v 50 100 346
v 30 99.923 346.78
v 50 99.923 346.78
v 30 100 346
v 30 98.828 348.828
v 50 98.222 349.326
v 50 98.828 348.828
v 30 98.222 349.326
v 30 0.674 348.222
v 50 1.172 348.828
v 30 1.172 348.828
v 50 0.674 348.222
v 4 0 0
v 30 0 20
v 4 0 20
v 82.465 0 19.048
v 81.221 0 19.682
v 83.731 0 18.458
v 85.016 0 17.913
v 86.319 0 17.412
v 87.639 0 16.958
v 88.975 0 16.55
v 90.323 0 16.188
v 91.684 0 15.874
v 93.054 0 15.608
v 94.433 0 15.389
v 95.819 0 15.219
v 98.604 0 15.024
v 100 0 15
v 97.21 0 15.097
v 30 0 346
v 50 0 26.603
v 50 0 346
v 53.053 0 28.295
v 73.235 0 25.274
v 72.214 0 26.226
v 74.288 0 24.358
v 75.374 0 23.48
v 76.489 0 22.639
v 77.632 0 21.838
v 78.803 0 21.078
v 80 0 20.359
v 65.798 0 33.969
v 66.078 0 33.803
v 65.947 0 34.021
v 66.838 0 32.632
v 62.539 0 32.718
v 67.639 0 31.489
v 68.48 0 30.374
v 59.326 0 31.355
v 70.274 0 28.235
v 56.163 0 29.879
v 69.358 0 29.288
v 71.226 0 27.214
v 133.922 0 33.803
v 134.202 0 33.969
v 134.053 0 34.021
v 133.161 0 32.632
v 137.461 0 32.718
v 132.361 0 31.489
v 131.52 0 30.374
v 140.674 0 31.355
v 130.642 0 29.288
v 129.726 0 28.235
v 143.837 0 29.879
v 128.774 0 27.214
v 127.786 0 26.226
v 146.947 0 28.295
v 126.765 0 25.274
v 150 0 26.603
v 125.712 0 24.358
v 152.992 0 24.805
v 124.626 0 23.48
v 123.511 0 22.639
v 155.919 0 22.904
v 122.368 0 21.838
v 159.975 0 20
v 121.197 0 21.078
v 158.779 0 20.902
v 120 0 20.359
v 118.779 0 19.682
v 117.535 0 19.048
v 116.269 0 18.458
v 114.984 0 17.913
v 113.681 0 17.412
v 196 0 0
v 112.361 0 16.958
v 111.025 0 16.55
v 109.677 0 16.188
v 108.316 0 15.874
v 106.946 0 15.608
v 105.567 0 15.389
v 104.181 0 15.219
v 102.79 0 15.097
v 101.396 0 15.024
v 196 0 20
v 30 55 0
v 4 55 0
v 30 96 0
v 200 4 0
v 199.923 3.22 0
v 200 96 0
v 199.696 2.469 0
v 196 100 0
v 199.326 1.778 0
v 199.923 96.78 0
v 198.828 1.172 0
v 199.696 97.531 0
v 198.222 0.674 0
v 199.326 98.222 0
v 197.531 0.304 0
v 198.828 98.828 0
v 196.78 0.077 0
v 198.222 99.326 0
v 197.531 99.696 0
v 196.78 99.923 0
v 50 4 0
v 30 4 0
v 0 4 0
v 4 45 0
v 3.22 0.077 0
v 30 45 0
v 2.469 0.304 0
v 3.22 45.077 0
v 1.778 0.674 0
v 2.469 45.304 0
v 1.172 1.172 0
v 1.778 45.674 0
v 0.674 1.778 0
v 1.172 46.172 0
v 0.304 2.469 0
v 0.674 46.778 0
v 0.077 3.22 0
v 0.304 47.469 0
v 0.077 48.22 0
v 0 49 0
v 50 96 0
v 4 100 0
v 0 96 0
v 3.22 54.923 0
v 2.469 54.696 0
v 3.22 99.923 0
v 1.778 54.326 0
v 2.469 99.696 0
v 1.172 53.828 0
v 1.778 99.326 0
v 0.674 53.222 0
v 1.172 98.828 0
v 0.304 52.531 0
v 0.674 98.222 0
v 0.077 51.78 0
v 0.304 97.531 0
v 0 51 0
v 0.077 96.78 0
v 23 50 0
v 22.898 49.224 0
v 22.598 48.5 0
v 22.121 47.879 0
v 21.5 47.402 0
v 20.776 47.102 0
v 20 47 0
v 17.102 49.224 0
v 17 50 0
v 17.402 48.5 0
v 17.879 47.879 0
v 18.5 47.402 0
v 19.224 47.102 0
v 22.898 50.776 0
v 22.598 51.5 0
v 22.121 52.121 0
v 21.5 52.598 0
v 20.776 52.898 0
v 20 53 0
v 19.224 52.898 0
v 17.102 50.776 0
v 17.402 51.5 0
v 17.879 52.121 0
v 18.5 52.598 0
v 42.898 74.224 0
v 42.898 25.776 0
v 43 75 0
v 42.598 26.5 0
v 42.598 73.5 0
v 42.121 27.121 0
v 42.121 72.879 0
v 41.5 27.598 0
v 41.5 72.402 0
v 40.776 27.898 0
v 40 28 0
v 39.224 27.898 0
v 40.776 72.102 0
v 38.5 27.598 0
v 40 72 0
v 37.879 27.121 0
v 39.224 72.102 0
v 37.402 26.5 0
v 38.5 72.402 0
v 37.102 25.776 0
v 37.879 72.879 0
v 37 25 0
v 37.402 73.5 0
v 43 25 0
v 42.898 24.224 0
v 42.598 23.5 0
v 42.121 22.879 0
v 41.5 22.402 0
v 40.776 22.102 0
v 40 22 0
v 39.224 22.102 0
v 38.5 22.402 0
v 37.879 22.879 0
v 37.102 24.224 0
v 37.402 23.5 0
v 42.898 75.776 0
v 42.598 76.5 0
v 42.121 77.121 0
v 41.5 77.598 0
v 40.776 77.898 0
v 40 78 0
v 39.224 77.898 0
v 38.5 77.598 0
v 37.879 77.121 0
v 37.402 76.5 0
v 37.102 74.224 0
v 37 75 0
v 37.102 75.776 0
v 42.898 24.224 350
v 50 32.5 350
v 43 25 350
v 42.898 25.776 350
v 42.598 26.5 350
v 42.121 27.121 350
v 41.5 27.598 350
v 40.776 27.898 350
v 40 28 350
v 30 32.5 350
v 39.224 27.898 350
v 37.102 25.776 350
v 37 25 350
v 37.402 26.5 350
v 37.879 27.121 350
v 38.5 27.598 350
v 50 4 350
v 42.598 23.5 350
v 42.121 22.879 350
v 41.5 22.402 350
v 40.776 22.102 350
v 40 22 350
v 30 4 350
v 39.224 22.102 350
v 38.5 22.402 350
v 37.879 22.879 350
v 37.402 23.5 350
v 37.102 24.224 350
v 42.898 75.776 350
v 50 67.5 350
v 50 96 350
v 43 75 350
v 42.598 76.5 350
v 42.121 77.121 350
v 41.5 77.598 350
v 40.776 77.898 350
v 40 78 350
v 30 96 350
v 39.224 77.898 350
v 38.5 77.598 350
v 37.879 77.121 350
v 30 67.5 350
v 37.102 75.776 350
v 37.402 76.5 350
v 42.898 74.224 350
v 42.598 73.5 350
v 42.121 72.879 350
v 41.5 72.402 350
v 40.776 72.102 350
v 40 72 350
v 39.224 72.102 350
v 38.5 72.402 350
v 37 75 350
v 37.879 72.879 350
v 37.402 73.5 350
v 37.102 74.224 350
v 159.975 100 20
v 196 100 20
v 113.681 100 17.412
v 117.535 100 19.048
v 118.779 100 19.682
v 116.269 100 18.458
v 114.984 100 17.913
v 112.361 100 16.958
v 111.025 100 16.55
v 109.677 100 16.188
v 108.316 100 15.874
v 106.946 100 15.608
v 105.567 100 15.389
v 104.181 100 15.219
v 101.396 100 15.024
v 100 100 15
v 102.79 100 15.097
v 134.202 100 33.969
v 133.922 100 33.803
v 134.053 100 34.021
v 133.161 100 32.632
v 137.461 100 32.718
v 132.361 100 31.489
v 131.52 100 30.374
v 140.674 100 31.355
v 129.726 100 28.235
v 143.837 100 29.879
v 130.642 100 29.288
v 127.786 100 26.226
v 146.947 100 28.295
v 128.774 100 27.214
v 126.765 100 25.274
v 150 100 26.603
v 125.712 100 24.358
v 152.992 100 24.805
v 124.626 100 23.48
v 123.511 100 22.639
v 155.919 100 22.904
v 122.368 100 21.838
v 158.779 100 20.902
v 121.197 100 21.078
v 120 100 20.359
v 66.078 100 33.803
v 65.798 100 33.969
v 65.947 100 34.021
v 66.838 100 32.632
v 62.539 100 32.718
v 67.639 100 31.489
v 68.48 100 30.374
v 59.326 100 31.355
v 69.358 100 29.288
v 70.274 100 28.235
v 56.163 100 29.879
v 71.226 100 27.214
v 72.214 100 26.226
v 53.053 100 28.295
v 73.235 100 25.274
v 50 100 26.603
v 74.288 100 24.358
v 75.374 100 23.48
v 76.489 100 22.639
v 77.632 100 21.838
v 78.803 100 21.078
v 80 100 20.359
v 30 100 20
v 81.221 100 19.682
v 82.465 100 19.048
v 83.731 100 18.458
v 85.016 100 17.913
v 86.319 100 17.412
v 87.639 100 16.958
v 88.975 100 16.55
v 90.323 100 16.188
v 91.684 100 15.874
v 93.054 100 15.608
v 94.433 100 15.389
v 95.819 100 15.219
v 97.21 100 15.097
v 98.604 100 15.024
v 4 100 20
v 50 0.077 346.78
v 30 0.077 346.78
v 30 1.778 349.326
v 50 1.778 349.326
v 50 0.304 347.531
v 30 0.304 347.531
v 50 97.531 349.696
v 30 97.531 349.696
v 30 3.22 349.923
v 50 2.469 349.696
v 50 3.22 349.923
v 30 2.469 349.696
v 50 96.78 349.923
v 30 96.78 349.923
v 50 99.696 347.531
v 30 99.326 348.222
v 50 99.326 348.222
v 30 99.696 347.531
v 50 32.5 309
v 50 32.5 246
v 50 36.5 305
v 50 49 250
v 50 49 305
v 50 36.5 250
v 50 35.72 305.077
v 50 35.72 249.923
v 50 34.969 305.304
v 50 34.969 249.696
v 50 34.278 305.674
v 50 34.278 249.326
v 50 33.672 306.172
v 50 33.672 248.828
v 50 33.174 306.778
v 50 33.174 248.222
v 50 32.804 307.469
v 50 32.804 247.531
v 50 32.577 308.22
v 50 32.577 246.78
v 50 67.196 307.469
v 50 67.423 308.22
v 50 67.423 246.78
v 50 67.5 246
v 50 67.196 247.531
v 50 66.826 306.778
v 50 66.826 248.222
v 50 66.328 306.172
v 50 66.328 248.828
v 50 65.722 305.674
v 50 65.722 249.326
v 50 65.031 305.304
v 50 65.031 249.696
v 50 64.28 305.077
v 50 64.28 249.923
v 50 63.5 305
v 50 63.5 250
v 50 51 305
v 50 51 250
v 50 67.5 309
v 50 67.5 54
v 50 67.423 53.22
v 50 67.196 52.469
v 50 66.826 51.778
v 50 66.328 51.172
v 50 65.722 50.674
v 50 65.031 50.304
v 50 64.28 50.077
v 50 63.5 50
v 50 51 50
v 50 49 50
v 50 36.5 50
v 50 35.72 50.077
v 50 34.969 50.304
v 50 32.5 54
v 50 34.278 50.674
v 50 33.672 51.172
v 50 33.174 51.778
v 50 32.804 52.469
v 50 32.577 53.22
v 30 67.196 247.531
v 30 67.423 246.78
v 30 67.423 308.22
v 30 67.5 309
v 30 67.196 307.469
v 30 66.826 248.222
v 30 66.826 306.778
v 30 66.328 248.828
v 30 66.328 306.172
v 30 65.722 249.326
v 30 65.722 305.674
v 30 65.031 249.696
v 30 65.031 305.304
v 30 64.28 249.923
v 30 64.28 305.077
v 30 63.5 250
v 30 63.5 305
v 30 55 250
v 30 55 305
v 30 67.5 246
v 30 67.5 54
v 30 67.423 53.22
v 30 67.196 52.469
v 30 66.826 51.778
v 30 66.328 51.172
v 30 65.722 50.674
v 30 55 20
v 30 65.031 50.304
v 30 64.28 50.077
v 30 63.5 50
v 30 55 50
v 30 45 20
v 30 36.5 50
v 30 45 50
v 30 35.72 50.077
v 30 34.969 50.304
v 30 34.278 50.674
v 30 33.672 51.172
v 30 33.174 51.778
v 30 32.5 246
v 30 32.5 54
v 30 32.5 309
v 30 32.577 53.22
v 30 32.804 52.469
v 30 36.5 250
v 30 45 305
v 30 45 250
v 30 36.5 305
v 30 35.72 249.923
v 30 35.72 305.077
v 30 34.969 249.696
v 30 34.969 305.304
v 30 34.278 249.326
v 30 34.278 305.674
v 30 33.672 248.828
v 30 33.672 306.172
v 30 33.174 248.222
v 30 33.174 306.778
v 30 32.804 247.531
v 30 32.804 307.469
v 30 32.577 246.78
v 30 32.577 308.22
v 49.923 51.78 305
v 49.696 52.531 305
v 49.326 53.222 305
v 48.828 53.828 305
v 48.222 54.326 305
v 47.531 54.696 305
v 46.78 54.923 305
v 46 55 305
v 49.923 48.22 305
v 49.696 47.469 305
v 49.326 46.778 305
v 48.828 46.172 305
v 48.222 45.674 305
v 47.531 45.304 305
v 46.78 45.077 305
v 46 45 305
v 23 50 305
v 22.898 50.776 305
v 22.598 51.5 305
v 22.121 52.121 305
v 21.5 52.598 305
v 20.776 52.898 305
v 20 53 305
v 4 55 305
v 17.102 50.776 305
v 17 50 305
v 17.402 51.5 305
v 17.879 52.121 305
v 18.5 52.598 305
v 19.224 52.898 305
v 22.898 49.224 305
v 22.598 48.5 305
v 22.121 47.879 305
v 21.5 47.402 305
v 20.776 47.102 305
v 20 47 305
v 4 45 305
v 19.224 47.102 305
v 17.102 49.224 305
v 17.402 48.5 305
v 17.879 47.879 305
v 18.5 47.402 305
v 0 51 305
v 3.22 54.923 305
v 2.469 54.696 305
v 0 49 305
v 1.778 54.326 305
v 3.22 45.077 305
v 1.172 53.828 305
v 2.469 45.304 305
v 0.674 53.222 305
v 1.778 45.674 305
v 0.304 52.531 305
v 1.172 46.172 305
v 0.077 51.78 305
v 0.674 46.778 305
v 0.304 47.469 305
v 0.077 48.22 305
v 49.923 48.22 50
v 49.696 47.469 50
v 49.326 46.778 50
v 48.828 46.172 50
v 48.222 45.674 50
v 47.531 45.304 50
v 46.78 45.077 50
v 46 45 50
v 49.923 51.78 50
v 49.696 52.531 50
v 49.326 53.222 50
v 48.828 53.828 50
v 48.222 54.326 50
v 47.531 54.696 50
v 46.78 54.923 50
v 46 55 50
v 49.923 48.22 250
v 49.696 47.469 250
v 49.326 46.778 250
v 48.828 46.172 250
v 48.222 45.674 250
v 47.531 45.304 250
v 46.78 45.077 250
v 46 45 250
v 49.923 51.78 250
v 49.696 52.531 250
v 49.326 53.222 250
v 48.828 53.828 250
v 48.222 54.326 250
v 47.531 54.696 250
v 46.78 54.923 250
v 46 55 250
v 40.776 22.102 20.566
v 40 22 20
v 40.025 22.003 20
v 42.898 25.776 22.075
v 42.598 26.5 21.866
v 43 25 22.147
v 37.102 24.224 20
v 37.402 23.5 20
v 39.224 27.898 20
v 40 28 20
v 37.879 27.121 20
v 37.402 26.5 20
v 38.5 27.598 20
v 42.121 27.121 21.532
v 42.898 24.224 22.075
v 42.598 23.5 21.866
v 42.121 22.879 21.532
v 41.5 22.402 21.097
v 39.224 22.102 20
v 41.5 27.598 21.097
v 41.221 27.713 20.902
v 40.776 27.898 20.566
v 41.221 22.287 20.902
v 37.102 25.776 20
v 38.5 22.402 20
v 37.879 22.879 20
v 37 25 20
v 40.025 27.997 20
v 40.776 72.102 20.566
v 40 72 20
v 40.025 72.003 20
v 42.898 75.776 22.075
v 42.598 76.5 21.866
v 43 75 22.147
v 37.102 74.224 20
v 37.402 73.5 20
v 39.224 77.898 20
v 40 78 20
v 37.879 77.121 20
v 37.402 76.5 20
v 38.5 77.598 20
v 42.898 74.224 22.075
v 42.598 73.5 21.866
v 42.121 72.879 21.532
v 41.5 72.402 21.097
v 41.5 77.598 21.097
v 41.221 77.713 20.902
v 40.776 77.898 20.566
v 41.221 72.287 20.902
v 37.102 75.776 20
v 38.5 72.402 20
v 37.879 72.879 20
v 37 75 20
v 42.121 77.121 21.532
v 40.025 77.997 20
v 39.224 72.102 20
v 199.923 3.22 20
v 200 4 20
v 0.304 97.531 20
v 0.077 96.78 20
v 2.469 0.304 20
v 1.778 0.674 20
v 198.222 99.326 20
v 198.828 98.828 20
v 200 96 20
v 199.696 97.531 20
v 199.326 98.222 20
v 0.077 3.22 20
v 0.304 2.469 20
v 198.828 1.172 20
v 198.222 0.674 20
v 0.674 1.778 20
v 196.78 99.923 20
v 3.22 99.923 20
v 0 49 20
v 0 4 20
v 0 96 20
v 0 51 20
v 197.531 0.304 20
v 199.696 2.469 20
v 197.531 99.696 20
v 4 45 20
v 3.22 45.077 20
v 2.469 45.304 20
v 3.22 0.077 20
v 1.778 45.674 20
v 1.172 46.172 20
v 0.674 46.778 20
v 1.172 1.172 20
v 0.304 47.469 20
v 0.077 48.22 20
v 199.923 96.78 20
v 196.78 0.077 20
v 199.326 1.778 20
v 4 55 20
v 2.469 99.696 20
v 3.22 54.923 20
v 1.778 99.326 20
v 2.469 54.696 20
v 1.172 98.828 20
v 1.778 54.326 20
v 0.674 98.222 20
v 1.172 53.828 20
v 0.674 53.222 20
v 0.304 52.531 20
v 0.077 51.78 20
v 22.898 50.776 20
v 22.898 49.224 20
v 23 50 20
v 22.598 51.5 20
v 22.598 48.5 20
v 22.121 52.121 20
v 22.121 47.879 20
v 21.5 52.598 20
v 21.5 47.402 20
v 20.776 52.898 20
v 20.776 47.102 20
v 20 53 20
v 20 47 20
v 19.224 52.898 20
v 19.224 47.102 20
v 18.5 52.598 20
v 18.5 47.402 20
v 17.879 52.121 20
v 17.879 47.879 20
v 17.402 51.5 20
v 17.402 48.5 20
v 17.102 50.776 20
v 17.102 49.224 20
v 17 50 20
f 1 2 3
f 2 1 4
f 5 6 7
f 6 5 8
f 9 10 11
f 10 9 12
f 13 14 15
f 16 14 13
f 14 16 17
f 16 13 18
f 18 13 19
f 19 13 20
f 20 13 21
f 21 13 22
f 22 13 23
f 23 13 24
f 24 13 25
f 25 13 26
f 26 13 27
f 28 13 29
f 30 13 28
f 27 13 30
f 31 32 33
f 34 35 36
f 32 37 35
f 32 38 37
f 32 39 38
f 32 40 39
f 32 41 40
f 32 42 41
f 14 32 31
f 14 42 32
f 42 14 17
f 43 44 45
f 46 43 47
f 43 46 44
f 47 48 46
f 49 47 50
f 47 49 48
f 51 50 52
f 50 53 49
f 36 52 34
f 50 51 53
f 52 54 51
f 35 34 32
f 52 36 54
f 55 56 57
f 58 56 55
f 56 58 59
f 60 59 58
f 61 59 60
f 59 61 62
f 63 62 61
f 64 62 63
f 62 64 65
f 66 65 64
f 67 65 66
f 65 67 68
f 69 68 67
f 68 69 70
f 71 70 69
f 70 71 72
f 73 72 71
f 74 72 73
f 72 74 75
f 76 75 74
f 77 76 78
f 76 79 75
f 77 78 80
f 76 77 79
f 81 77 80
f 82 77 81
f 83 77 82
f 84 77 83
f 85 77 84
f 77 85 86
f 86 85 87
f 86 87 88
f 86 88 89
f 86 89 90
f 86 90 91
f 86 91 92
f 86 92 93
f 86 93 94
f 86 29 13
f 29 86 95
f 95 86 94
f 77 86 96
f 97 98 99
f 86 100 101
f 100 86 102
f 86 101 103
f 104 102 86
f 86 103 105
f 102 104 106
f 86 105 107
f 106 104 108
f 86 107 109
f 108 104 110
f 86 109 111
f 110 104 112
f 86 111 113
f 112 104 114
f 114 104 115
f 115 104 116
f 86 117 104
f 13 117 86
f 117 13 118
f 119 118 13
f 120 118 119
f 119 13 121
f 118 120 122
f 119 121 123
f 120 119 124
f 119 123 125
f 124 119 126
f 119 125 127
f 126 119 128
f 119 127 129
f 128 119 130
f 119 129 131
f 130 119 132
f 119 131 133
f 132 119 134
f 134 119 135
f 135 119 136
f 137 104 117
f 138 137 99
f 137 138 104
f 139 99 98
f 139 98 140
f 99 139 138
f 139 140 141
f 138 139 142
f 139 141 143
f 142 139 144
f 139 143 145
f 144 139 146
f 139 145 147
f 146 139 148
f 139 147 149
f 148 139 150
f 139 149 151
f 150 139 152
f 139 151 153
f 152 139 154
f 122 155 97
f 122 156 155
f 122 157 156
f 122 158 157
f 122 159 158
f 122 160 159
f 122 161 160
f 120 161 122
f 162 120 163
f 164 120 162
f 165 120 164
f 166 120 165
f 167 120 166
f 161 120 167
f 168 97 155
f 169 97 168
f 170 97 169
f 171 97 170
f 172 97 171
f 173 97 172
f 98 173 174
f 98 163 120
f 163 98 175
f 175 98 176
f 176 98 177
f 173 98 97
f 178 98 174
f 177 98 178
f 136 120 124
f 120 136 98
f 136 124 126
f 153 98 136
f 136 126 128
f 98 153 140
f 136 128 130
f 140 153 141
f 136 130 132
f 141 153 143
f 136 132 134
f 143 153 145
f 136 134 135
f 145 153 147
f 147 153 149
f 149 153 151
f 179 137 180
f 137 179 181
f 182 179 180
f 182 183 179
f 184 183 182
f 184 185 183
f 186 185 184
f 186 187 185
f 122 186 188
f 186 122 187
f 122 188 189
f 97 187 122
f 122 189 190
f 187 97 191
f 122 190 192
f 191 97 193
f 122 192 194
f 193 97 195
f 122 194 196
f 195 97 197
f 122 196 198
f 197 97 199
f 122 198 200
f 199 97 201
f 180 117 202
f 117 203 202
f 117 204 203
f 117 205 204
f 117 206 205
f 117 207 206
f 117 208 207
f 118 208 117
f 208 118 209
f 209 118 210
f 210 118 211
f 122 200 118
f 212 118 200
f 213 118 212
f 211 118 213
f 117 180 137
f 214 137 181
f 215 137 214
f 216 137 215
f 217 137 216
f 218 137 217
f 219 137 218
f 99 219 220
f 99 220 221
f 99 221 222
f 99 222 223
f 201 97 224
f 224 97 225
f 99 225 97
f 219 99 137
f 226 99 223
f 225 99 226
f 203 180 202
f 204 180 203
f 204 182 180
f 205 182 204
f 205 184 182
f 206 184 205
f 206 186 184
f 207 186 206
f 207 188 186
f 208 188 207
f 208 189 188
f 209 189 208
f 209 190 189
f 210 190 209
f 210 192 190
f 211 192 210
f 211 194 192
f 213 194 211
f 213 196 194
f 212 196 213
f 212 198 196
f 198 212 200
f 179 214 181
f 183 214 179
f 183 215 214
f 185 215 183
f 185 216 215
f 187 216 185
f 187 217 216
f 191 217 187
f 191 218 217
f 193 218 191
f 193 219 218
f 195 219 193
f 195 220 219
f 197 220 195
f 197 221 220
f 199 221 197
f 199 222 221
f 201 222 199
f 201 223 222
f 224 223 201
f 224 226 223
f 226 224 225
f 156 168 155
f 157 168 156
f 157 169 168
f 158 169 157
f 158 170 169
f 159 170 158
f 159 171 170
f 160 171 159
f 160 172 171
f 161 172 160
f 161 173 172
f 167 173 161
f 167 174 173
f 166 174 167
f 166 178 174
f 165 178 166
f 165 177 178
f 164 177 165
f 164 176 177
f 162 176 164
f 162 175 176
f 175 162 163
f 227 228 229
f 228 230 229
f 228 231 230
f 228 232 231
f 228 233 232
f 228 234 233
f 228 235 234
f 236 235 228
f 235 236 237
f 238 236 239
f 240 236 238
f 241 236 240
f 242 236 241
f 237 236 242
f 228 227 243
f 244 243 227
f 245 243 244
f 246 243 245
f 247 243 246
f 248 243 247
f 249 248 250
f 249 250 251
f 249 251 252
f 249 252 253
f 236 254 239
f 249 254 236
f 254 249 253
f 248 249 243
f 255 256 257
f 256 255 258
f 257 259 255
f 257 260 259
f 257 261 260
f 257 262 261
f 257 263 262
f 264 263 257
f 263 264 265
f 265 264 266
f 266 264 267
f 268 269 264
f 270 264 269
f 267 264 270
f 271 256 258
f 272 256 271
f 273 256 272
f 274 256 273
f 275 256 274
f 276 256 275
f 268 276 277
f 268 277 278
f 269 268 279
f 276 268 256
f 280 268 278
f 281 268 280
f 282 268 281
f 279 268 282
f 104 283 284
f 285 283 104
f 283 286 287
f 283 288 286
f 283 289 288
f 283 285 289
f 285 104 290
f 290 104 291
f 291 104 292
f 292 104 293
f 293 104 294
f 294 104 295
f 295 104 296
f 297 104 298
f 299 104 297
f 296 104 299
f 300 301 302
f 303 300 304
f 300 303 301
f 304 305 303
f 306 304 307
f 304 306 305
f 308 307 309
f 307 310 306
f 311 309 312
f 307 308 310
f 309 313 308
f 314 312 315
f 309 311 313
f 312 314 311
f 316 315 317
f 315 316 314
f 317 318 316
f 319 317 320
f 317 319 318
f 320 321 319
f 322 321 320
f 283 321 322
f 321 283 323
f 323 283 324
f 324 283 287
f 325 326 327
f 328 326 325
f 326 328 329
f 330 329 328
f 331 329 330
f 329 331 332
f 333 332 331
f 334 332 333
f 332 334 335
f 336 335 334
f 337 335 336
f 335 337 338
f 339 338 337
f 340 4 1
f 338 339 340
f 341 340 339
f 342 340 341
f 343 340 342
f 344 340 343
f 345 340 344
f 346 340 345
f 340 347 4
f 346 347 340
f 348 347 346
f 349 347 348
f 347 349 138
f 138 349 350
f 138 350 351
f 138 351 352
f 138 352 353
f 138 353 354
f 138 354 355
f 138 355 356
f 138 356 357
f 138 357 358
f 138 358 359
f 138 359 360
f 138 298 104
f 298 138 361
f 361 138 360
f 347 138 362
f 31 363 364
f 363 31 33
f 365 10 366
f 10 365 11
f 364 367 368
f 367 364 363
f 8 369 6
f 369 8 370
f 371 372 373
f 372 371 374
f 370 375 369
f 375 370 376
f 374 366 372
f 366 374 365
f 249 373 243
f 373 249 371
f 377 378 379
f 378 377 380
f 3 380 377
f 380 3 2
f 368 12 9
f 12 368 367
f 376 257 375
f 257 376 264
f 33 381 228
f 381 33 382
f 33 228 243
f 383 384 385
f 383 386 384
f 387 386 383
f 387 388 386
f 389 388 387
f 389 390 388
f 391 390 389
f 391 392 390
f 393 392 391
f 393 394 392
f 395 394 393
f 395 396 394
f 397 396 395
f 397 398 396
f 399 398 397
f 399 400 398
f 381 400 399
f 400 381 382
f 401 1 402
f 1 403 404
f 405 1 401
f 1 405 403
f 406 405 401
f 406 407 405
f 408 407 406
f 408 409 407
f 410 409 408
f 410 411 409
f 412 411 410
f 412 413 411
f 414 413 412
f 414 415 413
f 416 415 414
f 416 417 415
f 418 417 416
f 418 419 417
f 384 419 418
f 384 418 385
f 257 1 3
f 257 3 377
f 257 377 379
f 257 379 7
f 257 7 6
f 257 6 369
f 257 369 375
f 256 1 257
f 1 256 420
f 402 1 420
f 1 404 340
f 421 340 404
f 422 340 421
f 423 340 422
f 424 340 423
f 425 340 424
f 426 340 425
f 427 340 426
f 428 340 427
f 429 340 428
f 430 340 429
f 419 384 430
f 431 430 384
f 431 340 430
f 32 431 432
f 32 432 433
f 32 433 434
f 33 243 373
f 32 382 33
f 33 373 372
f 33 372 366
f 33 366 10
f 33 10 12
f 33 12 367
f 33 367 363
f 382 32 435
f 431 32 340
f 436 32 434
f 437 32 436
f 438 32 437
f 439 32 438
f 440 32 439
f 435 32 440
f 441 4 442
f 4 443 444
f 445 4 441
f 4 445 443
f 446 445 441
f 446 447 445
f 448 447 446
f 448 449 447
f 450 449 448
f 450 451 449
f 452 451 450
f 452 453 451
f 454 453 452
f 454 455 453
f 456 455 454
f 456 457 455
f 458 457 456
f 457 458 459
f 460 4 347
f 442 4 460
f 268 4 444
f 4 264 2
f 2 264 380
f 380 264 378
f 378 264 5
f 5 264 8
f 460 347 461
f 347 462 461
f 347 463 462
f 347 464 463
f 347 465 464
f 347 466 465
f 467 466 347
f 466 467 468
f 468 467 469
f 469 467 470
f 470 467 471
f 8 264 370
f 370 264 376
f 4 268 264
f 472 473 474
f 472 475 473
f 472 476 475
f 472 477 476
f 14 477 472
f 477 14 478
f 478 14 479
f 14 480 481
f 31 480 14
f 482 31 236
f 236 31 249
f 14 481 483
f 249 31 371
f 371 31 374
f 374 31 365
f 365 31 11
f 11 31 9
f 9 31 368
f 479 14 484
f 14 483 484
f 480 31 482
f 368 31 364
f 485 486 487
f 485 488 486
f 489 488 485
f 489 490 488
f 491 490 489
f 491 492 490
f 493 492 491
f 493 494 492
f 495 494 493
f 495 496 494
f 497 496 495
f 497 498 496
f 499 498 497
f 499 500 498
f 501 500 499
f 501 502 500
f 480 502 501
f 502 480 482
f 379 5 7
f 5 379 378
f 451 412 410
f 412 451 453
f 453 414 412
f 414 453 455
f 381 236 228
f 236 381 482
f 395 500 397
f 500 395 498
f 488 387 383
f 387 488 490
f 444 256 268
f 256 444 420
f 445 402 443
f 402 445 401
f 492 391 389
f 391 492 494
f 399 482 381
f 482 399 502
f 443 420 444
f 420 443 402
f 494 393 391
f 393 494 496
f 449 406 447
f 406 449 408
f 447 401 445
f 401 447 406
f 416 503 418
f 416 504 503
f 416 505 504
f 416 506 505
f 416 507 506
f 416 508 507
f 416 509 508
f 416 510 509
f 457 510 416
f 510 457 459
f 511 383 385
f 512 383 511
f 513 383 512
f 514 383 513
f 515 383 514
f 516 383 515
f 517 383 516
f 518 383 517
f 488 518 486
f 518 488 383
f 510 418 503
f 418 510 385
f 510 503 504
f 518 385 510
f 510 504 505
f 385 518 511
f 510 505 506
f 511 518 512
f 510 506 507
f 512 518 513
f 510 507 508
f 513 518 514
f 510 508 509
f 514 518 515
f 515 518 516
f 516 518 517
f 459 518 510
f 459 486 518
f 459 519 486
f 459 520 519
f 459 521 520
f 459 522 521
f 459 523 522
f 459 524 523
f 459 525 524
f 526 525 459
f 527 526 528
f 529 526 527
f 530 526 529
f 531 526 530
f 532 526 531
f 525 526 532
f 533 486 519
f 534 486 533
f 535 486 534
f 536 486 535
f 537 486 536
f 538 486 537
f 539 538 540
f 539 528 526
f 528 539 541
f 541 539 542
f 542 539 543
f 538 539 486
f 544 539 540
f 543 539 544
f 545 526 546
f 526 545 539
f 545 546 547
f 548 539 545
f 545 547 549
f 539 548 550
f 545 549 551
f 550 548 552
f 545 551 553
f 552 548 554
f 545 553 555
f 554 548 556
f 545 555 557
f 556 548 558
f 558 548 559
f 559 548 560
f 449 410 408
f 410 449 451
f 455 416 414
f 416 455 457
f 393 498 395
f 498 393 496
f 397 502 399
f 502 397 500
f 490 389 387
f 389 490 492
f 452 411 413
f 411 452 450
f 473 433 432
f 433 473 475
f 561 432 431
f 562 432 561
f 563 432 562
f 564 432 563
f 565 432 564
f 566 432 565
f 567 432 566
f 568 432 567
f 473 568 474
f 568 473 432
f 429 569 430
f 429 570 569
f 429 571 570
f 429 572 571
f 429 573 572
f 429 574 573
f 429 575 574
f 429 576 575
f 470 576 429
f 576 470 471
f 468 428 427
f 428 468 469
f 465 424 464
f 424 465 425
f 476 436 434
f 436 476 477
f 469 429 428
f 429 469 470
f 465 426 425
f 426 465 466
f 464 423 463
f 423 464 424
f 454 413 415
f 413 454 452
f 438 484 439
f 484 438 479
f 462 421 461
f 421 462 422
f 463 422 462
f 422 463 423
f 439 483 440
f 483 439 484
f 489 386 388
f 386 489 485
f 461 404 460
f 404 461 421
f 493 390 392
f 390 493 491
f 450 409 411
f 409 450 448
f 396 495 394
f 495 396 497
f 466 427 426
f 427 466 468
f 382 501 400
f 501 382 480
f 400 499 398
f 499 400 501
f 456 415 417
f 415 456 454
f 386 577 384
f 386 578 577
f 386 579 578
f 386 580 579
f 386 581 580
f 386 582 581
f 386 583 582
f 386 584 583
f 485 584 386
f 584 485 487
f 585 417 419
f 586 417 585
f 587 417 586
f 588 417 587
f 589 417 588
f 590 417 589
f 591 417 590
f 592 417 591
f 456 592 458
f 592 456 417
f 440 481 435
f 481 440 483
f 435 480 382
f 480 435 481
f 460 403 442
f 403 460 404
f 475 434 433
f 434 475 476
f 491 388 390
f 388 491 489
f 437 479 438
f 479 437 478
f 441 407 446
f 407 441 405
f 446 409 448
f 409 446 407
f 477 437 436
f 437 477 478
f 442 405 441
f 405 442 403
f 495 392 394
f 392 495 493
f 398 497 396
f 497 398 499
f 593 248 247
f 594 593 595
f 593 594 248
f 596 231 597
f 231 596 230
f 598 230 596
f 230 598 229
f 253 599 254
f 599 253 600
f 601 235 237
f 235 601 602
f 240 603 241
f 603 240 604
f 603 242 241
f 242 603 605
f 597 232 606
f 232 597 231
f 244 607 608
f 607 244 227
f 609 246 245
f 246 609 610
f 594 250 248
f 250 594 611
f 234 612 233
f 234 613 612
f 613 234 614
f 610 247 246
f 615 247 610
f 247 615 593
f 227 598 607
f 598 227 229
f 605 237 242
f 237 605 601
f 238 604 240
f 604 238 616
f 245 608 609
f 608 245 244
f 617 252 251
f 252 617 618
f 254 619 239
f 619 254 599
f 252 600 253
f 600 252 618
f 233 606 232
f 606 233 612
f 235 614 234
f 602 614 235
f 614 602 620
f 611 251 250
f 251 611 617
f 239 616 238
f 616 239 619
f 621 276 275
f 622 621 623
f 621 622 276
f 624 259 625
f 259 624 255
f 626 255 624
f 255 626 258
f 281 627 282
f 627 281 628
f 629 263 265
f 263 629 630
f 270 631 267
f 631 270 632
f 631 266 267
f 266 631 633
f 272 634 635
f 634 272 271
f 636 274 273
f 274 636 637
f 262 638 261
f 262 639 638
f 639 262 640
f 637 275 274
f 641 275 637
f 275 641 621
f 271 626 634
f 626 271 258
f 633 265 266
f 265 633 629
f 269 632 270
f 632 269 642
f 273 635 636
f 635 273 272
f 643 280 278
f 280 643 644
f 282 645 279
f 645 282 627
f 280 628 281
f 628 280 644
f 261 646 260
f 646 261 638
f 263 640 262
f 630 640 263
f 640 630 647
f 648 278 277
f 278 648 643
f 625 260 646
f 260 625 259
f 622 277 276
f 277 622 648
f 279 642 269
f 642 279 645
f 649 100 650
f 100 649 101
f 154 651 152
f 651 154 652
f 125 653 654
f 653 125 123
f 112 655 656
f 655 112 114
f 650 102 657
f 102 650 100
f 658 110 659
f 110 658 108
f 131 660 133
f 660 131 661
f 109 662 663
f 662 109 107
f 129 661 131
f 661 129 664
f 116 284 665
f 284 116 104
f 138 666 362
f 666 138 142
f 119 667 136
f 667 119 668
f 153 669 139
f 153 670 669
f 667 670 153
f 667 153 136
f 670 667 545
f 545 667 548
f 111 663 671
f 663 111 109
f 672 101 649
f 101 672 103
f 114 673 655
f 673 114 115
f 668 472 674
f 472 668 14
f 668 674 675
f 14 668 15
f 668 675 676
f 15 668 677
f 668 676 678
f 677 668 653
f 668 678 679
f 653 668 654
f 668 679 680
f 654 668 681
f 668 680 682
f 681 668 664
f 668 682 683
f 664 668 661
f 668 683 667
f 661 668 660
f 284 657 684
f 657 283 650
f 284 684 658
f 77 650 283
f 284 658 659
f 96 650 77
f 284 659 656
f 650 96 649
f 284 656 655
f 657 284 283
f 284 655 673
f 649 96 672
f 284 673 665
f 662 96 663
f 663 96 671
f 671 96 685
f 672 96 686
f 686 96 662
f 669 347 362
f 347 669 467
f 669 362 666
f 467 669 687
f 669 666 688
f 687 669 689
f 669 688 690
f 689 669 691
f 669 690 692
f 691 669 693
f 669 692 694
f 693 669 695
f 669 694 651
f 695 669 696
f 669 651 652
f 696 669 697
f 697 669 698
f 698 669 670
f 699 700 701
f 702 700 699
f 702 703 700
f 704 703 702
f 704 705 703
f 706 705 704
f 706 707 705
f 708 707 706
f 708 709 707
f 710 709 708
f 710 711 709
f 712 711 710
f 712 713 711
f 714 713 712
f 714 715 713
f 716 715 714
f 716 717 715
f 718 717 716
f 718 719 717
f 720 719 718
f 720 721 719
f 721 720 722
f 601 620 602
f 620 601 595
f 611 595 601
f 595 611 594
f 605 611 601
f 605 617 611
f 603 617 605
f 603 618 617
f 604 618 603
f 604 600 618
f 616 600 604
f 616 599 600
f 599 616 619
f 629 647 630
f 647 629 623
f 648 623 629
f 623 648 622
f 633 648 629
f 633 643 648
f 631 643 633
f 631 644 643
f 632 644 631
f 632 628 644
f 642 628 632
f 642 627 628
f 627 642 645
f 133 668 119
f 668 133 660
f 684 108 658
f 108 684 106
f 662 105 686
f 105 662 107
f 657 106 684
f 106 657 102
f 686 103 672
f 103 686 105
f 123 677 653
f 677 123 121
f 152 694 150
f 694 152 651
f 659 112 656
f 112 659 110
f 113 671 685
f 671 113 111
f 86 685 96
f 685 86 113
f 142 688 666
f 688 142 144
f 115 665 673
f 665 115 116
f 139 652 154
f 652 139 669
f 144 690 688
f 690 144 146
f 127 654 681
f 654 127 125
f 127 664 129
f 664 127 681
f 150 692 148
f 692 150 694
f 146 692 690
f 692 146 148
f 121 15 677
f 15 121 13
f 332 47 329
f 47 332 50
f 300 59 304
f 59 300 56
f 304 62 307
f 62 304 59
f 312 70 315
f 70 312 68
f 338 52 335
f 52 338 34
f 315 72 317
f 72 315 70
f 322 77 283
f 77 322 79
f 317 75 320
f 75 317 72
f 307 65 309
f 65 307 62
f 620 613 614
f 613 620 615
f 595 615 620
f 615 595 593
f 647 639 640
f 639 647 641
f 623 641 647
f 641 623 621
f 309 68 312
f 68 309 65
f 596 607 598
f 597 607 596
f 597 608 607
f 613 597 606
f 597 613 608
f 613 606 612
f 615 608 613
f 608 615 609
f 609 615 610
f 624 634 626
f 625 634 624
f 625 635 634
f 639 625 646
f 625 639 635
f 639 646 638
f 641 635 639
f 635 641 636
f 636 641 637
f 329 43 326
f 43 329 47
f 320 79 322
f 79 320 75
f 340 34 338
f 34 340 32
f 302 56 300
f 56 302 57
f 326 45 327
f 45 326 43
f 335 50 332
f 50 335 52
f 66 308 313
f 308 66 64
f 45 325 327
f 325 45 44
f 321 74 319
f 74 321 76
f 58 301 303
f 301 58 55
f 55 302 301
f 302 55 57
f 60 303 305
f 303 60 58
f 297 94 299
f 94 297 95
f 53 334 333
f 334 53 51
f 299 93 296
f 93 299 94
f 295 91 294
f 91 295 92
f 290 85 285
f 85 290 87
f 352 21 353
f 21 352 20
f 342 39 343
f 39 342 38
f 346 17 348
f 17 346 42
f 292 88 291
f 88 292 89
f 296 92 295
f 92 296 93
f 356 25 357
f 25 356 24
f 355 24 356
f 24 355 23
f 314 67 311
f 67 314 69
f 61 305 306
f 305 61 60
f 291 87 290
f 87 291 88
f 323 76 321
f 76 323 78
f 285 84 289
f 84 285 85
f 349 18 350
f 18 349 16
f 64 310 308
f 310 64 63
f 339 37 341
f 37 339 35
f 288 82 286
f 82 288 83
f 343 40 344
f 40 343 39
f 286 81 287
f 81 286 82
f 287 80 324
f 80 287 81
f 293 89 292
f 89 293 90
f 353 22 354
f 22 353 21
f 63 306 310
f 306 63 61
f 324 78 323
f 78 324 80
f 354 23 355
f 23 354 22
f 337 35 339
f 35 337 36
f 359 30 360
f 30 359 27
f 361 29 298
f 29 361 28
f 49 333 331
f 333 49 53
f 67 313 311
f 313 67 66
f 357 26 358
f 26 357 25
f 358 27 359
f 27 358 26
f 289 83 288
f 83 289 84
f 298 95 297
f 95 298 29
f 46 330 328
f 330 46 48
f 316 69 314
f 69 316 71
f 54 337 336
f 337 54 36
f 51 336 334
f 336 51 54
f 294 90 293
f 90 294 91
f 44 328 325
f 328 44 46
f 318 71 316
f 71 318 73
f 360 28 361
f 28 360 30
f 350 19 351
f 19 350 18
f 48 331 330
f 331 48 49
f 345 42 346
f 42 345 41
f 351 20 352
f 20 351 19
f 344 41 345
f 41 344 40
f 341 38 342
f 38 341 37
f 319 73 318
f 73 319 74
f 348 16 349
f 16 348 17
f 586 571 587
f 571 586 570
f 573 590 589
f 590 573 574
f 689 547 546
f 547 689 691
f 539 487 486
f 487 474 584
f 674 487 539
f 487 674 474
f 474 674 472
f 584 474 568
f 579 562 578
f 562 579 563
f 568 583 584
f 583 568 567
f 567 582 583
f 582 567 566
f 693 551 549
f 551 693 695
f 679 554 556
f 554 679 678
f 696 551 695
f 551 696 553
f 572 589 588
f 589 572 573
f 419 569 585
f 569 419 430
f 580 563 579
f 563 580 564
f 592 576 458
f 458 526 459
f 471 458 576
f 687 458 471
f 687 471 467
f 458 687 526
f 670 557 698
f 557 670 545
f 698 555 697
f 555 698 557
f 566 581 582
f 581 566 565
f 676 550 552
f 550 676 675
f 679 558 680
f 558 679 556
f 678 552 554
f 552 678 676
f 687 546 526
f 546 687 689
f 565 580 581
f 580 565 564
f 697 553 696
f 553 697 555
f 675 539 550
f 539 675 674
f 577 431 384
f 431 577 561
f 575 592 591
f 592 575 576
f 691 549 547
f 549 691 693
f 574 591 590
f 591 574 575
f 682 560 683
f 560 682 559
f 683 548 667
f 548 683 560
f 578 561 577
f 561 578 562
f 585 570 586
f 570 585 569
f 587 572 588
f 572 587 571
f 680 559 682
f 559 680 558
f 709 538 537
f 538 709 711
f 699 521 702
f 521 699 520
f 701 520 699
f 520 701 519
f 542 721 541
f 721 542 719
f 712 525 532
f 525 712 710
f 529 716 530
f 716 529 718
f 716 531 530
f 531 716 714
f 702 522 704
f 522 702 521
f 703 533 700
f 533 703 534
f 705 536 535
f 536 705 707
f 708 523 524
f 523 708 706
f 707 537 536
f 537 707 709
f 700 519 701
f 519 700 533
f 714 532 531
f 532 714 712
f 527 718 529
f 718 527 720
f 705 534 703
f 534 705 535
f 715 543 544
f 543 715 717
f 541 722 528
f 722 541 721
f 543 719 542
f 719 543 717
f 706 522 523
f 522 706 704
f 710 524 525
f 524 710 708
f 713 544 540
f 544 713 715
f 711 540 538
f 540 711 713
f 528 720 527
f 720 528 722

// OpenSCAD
// file: ../lib/roundedRect.scad
module roundedRect2(size, radius) {
    translate([radius, radius, 0]) minkowski() {
        cube([size[0] - 2 * radius , size[1] - 2 * radius, size[2] -1]);
        cylinder(r=radius, h=1);
    }
}

module roundedRect(size, radius) {
    minkowski() {
        cube(size);
        cylinder(r=2,h=1);
    }
}
// main file
$fa=2;
$fs=0.8;
use <../lib/roundedRect.scad>;

module stand() {
    union() {
        difference(){
            // Main stand
            translate([30, 0, 350]) rotate([0, 90, 0]) roundedRect2([350, 100, 20], 4);
            translate([29, 32.5, 355]) rotate([0, 90, 0]) roundedRect2([50, 35, 40], 4);
            translate([29, 32.5, 250]) rotate([0, 90, 0]) roundedRect2([200, 35, 40], 4);
            // M6 reenforcements
            translate([40, 25, -30]) cylinder(h = 400, d = 6, center = false);
            translate([40, 75, -30]) cylinder(h = 400, d = 6, center = false);
            
            
        }
        union() {
            // Bottom plate
            
            difference() {
                union() {
                    roundedRect2([200, 100, 20], 4);
                    translate([100, 100, -60]) rotate([90, 0, 0]) cylinder(h = 100, d = 200, center = false);
                }
                translate([100, 110, 55]) rotate([90, 0, 0]) cylinder(h = 120, d = 80, center = false);
                translate([-20, -20, -200]) cube([400, 400, 200], center = false);
            }
        }
        // Back support
        difference() {
            translate([0, 45, 0]) roundedRect2([50, 10, 305], 4);
            translate([20, 50, -30]) cylinder(h = 400, d = 6, center = false);
        }
    }
}


difference() {
    stand();
    //translate([-10, -10, 180]) cube([400, 400, 400]); // z [bottom = 180 : top = -220] 
}
